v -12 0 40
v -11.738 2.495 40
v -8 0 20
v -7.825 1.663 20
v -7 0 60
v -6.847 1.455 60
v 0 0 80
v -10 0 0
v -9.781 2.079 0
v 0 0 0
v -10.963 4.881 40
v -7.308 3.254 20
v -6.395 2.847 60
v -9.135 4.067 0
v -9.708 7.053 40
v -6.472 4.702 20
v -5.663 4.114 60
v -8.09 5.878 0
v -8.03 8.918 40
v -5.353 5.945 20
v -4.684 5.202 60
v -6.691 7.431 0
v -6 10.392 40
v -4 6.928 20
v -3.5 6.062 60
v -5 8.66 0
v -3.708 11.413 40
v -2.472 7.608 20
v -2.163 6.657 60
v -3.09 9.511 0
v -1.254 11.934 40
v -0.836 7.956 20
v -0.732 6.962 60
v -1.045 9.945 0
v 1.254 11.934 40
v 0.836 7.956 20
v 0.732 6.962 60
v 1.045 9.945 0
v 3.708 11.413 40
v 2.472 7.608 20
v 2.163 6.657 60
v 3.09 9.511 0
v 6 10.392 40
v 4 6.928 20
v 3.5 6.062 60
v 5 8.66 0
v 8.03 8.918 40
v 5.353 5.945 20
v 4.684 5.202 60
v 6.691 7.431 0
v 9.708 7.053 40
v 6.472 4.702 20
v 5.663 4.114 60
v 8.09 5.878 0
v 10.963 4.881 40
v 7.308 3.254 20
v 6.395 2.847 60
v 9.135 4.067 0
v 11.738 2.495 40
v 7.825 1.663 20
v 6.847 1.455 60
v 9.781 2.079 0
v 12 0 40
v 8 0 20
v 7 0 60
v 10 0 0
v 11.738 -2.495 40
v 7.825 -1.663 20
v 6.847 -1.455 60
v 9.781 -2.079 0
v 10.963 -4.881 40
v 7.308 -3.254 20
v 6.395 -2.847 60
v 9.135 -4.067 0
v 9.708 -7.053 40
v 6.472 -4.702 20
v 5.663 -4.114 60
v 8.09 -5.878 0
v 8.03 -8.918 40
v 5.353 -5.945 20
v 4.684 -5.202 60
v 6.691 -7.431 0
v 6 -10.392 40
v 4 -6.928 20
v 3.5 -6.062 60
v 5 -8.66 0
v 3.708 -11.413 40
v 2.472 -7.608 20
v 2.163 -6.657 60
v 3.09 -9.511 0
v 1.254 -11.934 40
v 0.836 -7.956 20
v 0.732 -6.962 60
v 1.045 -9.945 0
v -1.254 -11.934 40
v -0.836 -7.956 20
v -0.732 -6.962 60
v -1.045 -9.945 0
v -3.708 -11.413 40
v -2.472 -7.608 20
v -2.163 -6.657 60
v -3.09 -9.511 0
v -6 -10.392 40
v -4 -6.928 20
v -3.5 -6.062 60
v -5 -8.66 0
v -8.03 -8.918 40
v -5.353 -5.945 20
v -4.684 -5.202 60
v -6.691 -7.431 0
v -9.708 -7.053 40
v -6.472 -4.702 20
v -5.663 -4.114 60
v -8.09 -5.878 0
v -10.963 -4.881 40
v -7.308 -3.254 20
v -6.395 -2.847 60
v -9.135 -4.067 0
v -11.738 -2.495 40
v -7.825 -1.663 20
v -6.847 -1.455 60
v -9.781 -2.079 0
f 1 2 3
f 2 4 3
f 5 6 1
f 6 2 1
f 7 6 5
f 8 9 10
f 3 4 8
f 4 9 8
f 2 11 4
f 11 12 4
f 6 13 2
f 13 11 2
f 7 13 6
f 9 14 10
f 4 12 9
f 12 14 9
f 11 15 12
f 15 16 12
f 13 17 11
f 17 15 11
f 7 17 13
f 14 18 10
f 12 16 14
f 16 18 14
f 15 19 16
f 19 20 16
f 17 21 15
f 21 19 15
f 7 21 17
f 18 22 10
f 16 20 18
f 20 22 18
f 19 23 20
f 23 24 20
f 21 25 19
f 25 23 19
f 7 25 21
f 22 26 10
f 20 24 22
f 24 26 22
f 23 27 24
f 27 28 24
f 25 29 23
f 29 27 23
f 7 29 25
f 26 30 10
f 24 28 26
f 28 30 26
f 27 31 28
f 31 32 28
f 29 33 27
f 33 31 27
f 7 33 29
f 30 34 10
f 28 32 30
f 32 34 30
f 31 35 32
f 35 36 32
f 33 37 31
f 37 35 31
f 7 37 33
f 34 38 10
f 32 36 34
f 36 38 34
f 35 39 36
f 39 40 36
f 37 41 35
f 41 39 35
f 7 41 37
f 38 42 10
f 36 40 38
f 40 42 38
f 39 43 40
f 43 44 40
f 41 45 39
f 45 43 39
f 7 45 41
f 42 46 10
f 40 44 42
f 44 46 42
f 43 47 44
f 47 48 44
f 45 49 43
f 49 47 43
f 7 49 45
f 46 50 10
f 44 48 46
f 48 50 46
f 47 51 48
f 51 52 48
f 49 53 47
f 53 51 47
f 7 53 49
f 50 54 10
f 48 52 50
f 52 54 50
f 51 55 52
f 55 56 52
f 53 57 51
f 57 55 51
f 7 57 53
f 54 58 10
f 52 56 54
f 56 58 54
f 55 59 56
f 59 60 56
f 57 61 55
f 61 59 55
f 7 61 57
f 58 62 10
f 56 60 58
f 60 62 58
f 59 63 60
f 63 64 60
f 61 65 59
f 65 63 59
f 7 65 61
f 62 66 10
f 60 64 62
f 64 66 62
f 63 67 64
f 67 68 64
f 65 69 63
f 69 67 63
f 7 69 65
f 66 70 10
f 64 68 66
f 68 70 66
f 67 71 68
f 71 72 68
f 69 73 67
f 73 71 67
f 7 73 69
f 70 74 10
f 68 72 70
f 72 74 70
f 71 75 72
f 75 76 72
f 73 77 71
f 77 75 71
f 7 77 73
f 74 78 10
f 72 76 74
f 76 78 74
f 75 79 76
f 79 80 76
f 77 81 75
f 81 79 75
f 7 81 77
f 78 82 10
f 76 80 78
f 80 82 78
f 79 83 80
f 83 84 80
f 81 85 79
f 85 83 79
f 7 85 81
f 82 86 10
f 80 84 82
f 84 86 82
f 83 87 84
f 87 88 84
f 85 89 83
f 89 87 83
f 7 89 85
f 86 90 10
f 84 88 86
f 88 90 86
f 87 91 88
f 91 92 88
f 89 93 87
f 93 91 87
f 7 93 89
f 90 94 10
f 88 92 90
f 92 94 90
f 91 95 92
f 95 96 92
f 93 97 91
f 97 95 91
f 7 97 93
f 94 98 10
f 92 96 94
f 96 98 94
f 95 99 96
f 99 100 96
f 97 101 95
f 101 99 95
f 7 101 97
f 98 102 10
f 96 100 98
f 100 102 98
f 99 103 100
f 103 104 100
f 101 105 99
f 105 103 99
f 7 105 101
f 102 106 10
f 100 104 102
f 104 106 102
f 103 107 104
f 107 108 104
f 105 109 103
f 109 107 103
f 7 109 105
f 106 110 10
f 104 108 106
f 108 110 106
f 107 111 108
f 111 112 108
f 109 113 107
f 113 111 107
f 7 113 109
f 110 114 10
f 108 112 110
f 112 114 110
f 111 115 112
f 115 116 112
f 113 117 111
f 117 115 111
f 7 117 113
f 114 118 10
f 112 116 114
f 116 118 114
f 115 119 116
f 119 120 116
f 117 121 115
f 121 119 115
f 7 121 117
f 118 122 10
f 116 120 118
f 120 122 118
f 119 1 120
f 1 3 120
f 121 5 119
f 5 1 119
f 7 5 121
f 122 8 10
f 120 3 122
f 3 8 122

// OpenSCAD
// Define a simple profile for the vase
vase_profile = [
    [0, 0],    // Bottom point at the origin
    [10, 0],   // Base of the vase (radius of 10 units)
    [8, 20],   // Tapering inward
    [12, 40],  // Widening outwards
    [7, 60],   // Neck of the vase
    [0, 80]    // Top of the vase
];

// Rotate the profile around the Z-axis to create a vase
rotate_extrude(angle = 360)
    polygon(vase_profile);
